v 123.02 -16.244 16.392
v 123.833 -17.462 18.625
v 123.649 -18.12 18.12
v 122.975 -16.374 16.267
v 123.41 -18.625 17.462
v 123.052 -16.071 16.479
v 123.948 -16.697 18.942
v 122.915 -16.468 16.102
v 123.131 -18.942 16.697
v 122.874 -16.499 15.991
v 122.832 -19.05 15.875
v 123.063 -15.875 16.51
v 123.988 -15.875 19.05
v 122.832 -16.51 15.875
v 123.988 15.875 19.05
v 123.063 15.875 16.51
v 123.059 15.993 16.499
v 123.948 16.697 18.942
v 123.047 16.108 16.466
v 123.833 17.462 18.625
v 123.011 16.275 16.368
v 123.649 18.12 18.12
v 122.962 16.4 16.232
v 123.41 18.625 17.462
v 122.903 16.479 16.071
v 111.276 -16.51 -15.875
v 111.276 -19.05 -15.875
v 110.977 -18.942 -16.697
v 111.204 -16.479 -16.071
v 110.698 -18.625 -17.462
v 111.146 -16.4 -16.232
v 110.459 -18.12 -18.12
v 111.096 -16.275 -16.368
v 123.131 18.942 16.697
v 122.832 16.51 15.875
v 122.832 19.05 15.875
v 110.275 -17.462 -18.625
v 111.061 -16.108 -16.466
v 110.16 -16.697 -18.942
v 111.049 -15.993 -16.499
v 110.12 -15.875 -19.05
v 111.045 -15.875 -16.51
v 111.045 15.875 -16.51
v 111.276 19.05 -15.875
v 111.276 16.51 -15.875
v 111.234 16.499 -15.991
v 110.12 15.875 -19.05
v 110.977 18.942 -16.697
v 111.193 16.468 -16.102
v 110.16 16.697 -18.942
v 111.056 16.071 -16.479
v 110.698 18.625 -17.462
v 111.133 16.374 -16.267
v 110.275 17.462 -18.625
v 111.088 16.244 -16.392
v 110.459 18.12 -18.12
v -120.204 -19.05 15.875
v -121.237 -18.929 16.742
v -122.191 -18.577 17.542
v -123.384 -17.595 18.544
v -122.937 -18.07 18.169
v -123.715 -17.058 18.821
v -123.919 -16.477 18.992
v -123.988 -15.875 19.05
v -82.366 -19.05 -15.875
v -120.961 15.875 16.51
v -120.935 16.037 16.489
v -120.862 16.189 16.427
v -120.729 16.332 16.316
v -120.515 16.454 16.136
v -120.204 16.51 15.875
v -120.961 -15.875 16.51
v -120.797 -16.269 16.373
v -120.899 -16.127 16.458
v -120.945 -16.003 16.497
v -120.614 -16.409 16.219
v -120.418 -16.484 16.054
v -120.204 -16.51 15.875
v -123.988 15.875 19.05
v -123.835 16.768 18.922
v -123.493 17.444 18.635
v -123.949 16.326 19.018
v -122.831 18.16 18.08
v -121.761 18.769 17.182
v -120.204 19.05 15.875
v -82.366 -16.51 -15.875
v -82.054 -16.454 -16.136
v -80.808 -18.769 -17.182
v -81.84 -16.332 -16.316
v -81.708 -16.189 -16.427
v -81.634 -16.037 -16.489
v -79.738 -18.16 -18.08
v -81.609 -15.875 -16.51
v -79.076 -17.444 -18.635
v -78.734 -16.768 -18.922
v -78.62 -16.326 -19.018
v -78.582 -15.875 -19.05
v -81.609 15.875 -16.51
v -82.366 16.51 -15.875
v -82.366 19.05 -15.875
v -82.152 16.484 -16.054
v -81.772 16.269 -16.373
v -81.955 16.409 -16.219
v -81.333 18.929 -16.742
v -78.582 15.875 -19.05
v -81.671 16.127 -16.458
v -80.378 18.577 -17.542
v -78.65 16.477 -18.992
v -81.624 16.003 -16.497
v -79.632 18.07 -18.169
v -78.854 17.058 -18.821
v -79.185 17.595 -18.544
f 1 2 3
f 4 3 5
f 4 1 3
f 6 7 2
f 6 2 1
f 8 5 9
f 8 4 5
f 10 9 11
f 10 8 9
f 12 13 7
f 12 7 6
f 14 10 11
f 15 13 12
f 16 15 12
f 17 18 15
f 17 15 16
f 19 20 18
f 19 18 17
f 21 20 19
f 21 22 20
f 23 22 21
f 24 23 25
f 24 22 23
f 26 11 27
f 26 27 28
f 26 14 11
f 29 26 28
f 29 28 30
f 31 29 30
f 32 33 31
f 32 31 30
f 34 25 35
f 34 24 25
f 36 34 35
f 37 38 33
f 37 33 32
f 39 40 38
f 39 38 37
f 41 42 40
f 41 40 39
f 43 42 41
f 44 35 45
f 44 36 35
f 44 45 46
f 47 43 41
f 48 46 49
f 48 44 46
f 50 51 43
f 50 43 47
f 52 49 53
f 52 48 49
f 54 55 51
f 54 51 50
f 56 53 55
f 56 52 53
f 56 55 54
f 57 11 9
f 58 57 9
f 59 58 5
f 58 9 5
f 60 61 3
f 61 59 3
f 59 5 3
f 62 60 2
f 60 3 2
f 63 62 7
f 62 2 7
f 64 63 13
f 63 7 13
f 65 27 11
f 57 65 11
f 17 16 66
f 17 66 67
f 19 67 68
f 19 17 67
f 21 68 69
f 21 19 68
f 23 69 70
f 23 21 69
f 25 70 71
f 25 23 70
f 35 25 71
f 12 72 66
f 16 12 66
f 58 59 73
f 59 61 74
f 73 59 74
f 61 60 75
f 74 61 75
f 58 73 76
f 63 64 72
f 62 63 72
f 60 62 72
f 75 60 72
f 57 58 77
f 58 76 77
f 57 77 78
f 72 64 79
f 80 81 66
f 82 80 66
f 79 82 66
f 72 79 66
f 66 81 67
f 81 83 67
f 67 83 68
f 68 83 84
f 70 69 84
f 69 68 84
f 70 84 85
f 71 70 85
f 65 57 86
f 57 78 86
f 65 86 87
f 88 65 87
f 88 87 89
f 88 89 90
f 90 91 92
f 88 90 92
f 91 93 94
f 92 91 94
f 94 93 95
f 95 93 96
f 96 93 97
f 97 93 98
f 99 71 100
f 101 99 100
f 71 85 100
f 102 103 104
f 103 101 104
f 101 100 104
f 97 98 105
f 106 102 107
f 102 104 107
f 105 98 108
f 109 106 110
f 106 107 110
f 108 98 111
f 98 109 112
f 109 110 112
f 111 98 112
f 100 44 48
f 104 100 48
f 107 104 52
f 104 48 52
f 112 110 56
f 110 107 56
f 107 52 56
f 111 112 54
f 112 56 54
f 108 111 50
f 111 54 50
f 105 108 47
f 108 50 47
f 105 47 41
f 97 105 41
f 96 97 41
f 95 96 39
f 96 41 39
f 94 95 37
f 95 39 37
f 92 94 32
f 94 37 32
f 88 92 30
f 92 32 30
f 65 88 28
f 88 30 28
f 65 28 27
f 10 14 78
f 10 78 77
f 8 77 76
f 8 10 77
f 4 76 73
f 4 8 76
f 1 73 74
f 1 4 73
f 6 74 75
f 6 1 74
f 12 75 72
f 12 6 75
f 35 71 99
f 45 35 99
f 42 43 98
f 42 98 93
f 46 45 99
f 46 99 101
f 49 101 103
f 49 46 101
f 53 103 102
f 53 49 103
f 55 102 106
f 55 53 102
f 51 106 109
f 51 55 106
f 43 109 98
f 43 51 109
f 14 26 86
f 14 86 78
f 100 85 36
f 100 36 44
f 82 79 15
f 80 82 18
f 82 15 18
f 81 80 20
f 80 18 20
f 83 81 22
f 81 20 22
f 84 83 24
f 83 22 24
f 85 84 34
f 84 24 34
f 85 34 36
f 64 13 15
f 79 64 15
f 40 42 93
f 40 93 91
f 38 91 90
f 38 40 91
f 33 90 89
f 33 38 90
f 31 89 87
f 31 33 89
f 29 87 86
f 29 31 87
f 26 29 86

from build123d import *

# Parameters (mm, degrees)
EXTRUDE_THIN1_DEPTH     = 123.98756
CUT_EXTRUDE1_DEPTH      = 1
CUT_EXTRUDE1_DEPTH_BACK = 39.1
CUT_EXTRUDE2_DEPTH      = 1
CUT_EXTRUDE2_DEPTH_BACK = 39.1


with BuildPart() as part:
    # Sketch1 → Extrude-Thin1 (new body, symmetric)
    with BuildSketch(Plane(origin=(0, 0, 0), x_dir=(0, 0, -1), z_dir=(1, 0, 0))):
        with BuildLine():
            Line((-15.875, 19.05), (15.875, 19.05))
            ThreePointArc((15.875, 19.05), (18.12006403, 18.12006403), (19.05, 15.875))
            Line((19.05, 15.875), (19.05, -15.875))
            ThreePointArc((19.05, -15.875), (18.12006403, -18.12006403), (15.875, -19.05))
            Line((15.875, -19.05), (-15.875, -19.05))
            ThreePointArc((-15.875, -19.05), (-18.12006403, -18.12006403), (-19.05, -15.875))
            Line((-19.05, -15.875), (-19.05, 15.875))
            ThreePointArc((-19.05, 15.875), (-18.12006403, 18.12006403), (-15.875, 19.05))
        make_face()
        with BuildLine():
            Line((-15.875, 16.51), (15.875, 16.51))
            ThreePointArc((15.875, 16.51), (16.324012806, 16.324012806), (16.51, 15.875))
            Line((16.51, 15.875), (16.51, -15.875))
            ThreePointArc((16.51, -15.875), (16.324012806, -16.324012806), (15.875, -16.51))
            Line((15.875, -16.51), (-15.875, -16.51))
            ThreePointArc((-15.875, -16.51), (-16.324012806, -16.324012806), (-16.51, -15.875))
            Line((-16.51, -15.875), (-16.51, 15.875))
            ThreePointArc((-16.51, 15.875), (-16.324012806, 16.324012806), (-15.875, 16.51))
        make_face(mode=Mode.SUBTRACT)
    extrude(amount=EXTRUDE_THIN1_DEPTH, both=True)

    # Sketch3 → Cut-Extrude1 (cut, two sides)
    with BuildSketch(Plane(origin=(0, 19.05, 0), x_dir=(1, 0, 0), z_dir=(0, 1, 0))) as cut_extrude1_sk:
        Polygon((299.02319091, -499.956443526), (123.98756, -19.05), (110.120294074, 19.05), (-64.915336836, 499.956443526), (896.897550216, 850.027705346), (1260.836077962, -149.885181705), align=None)
    extrude(amount=CUT_EXTRUDE1_DEPTH, mode=Mode.SUBTRACT)
    extrude(cut_extrude1_sk.sketch, amount=-CUT_EXTRUDE1_DEPTH_BACK, mode=Mode.SUBTRACT)

    # Sketch4 → Cut-Extrude2 (cut, two sides)
    with BuildSketch(Plane(origin=(0, 19.05, 0), x_dir=(1, 0, 0), z_dir=(0, 1, 0))) as cut_extrude2_sk:
        Polygon((-516.026084699, -348.009381482), (-123.98756, -19.05), (-78.581748122, 19.05), (313.456776576, 348.009381482), (-344.461986387, 1132.086430879), (-1173.944847663, 436.067667915), align=None)
    extrude(amount=CUT_EXTRUDE2_DEPTH, mode=Mode.SUBTRACT)
    extrude(cut_extrude2_sk.sketch, amount=-CUT_EXTRUDE2_DEPTH_BACK, mode=Mode.SUBTRACT)


solid = part.part
